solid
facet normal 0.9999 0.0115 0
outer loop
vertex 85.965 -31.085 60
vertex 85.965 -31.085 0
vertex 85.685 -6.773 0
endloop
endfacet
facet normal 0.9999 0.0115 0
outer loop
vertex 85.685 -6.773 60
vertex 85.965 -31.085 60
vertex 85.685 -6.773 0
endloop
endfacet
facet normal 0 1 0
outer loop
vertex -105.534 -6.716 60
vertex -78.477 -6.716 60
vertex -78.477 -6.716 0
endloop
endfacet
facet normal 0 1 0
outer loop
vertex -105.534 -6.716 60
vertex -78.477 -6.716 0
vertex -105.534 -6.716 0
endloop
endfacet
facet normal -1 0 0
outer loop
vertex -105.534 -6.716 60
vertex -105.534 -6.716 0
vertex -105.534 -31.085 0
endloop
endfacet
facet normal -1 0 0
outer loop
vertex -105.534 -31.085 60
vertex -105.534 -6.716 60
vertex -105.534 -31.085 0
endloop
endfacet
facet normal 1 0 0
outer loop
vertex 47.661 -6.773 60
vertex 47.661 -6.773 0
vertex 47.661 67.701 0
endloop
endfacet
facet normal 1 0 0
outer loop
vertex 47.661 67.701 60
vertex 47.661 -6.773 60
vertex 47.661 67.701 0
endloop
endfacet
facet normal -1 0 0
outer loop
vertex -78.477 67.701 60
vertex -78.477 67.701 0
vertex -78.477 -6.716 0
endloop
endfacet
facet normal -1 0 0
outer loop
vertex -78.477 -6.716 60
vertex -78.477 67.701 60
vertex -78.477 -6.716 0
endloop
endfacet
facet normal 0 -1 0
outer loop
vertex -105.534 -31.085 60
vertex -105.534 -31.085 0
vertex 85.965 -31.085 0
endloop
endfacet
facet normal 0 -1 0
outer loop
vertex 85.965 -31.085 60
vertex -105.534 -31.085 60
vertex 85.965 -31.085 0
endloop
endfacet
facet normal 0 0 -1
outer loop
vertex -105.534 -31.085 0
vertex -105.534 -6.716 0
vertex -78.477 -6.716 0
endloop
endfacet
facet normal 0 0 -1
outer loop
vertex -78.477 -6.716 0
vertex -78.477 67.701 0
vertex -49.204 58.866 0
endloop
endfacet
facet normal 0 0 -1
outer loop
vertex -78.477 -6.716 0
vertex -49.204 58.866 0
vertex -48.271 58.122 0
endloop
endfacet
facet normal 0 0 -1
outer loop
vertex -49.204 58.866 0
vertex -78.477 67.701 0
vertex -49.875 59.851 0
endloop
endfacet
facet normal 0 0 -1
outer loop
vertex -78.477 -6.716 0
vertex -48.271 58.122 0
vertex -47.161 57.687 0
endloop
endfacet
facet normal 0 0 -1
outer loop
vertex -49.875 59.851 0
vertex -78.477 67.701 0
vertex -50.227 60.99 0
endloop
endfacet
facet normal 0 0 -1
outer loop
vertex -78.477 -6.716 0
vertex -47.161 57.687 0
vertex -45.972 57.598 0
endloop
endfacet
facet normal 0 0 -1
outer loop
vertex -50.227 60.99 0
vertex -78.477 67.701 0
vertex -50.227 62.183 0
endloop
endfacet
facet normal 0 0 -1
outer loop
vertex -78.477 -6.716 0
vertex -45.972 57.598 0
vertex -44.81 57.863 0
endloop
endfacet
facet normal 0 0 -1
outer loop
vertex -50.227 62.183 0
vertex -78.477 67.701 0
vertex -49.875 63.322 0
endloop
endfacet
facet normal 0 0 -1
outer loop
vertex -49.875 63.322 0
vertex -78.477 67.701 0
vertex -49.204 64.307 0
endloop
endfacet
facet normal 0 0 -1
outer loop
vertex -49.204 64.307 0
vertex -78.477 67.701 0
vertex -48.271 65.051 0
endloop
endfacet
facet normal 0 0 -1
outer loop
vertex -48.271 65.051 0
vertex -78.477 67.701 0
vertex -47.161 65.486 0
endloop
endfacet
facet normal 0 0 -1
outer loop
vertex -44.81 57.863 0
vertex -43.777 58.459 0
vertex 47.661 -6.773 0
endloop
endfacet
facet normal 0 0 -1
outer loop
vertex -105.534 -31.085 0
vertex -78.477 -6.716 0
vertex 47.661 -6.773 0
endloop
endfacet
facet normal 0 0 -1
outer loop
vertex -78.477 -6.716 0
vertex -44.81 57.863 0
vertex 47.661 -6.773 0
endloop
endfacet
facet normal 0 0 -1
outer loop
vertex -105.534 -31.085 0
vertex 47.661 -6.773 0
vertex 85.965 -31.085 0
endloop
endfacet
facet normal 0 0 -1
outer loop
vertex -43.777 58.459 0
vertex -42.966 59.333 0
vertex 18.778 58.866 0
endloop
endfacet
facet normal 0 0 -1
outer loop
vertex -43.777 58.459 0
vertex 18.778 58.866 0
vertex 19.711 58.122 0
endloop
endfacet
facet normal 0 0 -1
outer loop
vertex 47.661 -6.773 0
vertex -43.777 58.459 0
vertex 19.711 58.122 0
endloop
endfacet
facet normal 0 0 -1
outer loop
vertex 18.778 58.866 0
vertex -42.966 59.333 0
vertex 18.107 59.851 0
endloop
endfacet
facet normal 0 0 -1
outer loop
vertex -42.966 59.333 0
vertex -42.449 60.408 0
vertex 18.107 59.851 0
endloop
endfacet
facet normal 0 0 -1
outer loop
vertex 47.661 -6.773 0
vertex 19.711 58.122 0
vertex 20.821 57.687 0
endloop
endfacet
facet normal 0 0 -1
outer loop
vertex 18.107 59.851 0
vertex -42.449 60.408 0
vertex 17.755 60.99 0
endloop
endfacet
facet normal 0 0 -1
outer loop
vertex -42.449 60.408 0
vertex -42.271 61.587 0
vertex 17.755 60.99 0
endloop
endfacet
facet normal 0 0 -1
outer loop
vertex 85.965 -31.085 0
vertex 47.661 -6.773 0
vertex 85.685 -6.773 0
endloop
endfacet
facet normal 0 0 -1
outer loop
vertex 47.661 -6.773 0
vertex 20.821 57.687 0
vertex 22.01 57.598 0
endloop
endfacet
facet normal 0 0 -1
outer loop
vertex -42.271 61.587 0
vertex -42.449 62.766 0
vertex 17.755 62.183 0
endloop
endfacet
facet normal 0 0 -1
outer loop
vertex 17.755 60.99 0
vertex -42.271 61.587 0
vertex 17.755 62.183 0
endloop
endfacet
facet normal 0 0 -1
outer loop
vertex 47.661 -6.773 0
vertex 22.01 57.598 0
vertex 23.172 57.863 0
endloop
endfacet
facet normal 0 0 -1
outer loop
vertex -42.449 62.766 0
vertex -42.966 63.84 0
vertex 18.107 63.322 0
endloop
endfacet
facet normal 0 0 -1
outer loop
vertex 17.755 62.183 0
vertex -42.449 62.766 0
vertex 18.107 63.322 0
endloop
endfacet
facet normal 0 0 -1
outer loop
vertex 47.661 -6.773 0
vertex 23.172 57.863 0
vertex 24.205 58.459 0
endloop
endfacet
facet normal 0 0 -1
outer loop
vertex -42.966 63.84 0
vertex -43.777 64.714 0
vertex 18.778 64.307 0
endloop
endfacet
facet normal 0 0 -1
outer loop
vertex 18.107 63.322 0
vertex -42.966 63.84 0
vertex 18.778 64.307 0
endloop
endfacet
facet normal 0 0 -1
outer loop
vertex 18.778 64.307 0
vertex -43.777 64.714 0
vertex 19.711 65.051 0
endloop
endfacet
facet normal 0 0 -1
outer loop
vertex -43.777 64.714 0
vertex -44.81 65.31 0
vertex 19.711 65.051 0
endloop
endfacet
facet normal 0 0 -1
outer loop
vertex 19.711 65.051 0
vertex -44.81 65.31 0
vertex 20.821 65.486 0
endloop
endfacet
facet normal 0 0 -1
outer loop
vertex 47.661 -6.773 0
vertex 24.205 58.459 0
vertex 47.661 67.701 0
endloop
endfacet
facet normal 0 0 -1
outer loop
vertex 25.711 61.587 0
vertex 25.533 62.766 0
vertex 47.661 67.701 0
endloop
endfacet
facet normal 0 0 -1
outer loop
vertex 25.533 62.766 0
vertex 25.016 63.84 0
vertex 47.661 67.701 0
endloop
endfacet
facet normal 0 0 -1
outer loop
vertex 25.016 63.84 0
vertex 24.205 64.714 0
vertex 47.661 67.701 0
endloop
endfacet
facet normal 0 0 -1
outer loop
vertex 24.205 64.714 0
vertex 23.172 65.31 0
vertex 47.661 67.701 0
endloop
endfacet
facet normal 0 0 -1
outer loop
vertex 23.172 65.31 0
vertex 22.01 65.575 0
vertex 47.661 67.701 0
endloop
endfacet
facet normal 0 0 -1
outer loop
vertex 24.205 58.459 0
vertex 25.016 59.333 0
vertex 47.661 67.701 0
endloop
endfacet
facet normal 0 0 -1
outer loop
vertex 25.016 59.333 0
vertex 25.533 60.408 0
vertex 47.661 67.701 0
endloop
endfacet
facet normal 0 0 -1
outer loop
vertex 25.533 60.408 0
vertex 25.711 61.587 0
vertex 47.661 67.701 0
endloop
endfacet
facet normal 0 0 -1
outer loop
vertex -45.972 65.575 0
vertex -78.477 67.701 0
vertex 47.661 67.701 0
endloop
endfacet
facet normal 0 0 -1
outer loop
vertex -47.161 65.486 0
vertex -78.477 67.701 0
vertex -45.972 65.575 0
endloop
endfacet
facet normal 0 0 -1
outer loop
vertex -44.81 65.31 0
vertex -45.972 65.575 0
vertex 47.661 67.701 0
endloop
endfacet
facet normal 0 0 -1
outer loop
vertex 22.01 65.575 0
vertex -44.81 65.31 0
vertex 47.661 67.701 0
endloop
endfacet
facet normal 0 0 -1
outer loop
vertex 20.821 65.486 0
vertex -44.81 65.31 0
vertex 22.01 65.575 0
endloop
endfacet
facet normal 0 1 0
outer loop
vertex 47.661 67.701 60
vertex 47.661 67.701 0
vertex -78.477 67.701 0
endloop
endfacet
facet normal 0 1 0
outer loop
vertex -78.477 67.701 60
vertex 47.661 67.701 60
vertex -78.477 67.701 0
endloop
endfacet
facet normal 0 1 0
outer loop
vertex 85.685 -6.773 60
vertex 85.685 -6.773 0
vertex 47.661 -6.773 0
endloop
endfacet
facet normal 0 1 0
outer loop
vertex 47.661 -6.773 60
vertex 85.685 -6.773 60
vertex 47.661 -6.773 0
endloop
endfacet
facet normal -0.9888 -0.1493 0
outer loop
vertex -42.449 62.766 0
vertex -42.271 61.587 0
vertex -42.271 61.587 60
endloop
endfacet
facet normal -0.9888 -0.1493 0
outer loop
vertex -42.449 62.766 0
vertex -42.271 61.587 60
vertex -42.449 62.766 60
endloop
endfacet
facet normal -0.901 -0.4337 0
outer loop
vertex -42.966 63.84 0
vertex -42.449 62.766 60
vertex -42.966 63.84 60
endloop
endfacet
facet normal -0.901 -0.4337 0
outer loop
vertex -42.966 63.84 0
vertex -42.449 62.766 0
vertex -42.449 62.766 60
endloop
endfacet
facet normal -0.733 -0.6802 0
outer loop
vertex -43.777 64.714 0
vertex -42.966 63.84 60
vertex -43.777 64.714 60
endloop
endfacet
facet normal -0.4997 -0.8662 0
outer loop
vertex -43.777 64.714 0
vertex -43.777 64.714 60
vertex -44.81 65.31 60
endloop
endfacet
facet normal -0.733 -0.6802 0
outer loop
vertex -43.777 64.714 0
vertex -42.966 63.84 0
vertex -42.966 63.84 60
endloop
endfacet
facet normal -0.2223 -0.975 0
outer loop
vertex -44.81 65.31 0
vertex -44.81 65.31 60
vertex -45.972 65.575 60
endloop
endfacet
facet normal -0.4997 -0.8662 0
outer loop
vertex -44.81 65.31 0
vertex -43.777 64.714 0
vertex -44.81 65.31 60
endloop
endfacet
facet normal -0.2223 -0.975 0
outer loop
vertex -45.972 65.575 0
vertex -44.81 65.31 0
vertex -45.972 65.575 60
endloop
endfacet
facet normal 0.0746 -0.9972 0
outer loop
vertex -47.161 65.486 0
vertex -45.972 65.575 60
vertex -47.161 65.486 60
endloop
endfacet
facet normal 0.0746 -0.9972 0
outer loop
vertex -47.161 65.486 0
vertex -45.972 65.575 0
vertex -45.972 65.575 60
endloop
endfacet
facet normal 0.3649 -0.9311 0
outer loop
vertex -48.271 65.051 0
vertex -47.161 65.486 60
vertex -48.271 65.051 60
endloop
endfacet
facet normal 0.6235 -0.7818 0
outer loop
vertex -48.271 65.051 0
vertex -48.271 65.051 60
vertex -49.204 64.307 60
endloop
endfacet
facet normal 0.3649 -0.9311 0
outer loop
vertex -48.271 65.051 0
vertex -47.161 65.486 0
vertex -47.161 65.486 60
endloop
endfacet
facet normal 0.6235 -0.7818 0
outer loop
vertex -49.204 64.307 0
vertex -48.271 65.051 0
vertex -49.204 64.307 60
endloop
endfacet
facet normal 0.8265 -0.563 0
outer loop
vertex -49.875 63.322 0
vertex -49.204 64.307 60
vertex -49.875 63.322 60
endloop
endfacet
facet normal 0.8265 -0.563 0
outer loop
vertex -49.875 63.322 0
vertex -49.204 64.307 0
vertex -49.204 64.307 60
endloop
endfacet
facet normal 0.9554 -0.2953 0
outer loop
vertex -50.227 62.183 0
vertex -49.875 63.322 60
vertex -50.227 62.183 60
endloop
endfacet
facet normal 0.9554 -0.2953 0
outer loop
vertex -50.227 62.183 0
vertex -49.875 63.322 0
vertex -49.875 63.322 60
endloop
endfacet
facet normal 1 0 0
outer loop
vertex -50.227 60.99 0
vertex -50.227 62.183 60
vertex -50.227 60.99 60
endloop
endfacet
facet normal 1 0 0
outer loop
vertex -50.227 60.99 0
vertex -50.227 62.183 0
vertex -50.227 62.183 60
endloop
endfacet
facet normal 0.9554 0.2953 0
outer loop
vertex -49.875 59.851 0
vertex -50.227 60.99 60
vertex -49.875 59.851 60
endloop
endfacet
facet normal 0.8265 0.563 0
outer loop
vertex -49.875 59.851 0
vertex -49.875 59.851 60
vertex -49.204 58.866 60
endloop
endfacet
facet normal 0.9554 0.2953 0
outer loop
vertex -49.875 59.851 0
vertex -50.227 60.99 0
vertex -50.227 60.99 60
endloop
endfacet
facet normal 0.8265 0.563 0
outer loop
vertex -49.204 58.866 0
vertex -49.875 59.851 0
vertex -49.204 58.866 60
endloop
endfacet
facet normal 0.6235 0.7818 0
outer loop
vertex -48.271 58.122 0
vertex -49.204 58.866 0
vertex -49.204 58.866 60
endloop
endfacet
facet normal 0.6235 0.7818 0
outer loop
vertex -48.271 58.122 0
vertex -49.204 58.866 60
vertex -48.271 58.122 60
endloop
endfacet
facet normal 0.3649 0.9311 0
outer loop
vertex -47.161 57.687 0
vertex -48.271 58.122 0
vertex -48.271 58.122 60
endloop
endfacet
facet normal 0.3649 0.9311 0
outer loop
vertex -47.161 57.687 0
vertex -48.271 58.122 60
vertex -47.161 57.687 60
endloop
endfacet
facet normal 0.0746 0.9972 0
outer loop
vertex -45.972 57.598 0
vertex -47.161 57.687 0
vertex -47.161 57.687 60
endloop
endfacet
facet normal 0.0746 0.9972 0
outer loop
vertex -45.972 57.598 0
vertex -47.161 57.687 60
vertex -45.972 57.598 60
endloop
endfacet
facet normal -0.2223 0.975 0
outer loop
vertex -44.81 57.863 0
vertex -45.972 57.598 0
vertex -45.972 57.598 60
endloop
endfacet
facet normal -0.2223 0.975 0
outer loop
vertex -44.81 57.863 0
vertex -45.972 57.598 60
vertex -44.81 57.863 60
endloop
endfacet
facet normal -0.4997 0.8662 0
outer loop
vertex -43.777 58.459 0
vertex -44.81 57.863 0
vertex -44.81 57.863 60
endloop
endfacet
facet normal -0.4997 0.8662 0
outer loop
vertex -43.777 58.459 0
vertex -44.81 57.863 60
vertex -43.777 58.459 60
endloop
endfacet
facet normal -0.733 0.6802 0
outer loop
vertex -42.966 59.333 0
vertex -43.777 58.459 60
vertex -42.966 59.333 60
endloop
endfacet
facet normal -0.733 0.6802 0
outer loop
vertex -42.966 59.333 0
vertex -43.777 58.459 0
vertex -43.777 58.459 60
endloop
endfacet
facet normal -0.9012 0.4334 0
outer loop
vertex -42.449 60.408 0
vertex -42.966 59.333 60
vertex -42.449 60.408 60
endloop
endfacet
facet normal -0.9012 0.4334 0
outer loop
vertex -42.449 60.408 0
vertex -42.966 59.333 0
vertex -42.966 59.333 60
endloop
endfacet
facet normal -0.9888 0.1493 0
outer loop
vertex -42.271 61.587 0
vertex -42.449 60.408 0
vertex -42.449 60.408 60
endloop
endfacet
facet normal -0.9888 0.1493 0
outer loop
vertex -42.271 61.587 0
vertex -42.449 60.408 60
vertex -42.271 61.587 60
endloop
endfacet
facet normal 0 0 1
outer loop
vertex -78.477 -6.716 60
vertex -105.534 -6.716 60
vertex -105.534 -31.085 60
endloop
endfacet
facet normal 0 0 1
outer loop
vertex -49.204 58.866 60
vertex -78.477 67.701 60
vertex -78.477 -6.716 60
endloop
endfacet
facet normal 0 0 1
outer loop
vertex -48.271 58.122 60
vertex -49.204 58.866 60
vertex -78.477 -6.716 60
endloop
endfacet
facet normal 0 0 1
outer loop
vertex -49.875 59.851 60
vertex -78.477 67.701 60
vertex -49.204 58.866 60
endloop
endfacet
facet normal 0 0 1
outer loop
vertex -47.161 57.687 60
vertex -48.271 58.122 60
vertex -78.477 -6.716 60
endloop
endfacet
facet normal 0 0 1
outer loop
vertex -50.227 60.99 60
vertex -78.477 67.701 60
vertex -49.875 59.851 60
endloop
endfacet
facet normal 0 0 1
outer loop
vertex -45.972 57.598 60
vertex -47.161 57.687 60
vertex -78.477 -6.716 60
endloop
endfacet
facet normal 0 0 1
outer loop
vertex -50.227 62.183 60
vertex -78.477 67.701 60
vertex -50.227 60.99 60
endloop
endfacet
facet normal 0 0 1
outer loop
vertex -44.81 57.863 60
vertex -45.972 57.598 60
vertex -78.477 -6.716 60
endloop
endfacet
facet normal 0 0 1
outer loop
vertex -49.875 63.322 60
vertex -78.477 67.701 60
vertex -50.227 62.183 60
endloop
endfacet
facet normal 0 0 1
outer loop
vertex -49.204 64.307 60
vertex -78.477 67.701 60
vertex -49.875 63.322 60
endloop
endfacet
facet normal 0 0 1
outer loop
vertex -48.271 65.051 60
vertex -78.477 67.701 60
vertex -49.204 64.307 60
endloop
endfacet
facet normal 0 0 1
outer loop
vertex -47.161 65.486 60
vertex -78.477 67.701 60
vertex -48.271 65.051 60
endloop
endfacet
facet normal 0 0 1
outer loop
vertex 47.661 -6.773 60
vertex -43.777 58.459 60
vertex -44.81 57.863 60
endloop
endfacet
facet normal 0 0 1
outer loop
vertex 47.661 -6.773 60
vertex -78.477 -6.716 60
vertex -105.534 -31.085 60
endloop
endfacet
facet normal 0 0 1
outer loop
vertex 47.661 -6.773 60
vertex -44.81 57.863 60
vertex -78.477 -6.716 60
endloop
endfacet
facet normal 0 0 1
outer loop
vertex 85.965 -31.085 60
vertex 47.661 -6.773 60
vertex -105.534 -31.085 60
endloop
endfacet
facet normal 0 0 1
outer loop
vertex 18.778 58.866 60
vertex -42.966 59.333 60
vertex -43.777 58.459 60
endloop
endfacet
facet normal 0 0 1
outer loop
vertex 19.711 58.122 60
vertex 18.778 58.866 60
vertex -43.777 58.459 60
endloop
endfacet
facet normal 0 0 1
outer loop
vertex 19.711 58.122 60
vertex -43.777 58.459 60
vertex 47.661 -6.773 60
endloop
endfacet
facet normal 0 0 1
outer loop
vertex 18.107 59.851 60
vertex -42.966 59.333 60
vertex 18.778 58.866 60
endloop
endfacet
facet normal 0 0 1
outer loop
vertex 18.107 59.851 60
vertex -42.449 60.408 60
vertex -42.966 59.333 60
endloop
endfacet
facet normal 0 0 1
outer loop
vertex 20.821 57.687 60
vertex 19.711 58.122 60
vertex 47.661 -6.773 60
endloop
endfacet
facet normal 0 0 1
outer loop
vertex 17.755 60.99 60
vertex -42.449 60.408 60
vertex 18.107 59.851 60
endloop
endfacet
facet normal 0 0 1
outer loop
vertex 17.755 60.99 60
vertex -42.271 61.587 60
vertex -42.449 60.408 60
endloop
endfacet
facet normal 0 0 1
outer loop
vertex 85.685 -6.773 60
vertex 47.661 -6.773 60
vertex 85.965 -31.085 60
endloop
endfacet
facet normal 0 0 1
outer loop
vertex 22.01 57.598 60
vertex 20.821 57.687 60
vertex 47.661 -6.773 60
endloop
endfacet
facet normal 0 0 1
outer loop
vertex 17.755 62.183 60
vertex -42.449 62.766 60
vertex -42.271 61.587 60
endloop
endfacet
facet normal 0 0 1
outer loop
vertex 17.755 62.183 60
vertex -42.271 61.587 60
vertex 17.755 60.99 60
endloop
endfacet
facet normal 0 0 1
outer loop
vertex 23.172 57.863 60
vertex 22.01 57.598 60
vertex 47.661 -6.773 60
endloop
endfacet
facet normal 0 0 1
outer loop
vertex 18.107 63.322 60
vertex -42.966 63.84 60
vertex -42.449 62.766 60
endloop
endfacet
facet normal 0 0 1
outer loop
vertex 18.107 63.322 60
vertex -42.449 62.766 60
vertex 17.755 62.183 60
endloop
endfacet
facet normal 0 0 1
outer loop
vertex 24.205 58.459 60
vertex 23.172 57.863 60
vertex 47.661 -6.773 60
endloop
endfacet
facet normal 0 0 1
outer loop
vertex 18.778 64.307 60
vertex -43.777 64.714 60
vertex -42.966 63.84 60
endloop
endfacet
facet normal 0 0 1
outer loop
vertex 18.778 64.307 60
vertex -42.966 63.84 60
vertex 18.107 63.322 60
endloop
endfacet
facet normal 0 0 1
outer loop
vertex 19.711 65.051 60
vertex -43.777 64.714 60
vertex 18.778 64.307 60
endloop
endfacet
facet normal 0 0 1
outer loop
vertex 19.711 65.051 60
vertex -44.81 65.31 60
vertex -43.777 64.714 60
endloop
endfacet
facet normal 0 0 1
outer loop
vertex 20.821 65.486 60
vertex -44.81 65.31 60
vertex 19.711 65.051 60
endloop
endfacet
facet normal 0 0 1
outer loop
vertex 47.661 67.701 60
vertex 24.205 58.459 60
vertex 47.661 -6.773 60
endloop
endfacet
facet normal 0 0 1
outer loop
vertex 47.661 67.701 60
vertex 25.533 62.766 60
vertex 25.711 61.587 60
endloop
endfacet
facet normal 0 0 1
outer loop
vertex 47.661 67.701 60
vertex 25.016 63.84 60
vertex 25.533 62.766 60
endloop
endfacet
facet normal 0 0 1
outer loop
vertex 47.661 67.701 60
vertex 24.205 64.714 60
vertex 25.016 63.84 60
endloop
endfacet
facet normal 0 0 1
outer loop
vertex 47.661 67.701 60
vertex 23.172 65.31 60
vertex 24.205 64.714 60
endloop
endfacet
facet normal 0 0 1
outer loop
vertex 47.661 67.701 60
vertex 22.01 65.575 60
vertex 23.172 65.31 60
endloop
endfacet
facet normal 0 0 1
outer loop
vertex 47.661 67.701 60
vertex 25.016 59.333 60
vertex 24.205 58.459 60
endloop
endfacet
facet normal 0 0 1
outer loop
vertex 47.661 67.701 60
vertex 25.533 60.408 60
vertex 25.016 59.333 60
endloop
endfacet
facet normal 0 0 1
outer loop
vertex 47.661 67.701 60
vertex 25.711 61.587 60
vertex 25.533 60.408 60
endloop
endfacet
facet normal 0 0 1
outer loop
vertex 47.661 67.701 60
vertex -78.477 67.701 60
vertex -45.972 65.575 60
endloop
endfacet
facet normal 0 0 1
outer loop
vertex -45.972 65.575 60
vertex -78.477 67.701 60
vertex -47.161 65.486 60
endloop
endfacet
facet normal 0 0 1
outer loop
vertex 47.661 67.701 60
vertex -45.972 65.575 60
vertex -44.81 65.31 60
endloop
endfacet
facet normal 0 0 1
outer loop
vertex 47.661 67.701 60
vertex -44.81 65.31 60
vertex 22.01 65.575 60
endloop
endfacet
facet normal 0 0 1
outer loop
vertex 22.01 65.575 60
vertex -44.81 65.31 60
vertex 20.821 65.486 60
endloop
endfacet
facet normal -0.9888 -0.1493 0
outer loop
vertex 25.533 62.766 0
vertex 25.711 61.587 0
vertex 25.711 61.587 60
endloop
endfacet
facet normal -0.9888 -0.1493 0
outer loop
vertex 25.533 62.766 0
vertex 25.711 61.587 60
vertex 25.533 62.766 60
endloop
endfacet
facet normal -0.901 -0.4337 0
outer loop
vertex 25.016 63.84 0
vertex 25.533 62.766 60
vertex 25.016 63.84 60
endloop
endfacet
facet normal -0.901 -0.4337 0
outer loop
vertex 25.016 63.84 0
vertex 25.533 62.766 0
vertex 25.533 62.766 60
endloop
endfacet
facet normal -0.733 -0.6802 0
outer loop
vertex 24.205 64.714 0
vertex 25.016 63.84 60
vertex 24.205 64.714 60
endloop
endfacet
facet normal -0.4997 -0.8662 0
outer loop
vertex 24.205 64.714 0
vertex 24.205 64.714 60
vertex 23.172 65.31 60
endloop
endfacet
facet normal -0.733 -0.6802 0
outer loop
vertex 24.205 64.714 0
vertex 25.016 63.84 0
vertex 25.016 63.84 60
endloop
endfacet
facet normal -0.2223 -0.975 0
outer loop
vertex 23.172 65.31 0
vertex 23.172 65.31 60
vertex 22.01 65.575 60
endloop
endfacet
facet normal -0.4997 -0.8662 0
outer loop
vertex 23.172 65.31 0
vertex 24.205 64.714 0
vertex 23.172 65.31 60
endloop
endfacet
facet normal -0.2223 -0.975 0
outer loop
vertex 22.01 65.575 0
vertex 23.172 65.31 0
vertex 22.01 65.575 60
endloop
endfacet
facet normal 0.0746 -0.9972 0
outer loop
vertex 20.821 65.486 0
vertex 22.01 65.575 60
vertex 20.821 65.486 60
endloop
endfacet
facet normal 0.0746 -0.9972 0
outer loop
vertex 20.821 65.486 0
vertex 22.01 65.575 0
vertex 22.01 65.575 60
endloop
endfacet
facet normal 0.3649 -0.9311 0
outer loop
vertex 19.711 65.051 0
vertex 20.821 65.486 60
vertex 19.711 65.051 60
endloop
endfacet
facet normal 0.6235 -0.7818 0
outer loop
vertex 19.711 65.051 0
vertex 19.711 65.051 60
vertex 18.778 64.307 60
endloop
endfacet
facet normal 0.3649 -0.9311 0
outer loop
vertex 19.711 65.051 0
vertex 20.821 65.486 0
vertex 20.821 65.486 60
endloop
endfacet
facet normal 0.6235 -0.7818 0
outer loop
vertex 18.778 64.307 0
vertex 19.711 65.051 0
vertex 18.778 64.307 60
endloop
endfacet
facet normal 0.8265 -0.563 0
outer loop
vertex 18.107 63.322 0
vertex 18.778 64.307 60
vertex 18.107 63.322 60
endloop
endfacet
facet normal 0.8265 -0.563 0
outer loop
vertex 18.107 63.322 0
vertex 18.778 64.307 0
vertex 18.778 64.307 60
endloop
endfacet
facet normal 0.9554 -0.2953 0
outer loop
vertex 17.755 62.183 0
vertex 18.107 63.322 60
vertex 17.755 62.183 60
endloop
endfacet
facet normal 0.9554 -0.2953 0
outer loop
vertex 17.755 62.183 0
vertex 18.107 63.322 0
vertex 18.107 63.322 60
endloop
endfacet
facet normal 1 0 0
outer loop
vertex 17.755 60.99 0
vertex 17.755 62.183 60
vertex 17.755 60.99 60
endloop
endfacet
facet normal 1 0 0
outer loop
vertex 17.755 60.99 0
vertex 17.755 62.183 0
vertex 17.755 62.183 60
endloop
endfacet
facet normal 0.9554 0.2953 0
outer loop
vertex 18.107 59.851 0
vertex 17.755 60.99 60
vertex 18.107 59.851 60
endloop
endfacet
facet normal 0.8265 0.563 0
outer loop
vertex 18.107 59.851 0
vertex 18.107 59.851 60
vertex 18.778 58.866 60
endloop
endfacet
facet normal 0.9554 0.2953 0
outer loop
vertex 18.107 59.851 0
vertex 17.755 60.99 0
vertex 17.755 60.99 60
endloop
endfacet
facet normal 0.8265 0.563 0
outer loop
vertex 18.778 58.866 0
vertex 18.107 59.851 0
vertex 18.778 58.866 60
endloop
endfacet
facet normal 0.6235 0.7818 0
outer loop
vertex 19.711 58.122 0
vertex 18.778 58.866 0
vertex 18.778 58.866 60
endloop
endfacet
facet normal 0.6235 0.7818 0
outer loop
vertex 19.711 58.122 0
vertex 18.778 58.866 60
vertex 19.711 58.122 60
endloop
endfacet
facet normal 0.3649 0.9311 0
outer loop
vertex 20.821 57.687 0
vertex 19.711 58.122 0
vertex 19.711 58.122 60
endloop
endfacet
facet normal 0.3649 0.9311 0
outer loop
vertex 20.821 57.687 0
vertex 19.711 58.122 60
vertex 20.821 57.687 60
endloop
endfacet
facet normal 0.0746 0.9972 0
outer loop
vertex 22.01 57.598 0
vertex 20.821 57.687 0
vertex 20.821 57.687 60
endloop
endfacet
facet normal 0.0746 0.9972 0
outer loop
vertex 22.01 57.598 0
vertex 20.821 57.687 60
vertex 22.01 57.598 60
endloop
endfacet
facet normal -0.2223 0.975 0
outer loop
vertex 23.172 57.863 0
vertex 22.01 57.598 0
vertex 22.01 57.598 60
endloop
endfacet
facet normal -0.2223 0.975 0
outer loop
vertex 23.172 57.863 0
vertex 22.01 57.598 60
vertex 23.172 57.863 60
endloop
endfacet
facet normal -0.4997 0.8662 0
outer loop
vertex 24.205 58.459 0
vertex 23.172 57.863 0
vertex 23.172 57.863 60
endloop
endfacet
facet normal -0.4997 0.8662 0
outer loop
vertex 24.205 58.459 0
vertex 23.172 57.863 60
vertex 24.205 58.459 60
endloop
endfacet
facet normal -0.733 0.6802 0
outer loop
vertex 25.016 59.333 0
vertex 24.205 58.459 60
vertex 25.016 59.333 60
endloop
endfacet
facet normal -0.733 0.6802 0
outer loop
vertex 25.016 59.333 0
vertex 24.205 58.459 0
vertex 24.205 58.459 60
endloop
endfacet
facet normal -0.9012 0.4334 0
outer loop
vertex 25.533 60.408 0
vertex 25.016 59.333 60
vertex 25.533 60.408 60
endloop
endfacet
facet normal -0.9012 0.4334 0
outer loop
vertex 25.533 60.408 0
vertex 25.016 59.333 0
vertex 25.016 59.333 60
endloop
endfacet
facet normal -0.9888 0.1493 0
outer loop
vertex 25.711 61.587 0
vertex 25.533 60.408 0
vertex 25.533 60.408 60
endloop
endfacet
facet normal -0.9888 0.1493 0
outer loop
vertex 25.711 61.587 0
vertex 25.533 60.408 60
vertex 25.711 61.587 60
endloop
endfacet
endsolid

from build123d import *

# Parameters (mm, degrees)
SKETCH1_R           = 4
BOSS_EXTRUDE1_DEPTH = 60


with BuildPart() as part:
    # Sketch1 → Boss-Extrude1 (new body)
    with BuildSketch(Plane.XY):
        Polygon((-78.477343622, -6.715827259), (-105.53442836, -6.715827259), (-105.53442836, -31.084686171), (-55.837306641, -31.084686171), (31.27656695, -31.084686171), (85.964626644, -31.084686171), (85.685037395, -6.772556192), (47.660564626, -6.772556192), (47.660564626, 67.701117608), (-78.477343622, 67.701117608), align=None)
        with Locations((-46.271365908, 61.586520729)):
            Circle(SKETCH1_R, mode=Mode.SUBTRACT)
        with Locations((21.710626217, 61.586520729)):
            Circle(SKETCH1_R, mode=Mode.SUBTRACT)
    extrude(amount=BOSS_EXTRUDE1_DEPTH)


solid = part.part
